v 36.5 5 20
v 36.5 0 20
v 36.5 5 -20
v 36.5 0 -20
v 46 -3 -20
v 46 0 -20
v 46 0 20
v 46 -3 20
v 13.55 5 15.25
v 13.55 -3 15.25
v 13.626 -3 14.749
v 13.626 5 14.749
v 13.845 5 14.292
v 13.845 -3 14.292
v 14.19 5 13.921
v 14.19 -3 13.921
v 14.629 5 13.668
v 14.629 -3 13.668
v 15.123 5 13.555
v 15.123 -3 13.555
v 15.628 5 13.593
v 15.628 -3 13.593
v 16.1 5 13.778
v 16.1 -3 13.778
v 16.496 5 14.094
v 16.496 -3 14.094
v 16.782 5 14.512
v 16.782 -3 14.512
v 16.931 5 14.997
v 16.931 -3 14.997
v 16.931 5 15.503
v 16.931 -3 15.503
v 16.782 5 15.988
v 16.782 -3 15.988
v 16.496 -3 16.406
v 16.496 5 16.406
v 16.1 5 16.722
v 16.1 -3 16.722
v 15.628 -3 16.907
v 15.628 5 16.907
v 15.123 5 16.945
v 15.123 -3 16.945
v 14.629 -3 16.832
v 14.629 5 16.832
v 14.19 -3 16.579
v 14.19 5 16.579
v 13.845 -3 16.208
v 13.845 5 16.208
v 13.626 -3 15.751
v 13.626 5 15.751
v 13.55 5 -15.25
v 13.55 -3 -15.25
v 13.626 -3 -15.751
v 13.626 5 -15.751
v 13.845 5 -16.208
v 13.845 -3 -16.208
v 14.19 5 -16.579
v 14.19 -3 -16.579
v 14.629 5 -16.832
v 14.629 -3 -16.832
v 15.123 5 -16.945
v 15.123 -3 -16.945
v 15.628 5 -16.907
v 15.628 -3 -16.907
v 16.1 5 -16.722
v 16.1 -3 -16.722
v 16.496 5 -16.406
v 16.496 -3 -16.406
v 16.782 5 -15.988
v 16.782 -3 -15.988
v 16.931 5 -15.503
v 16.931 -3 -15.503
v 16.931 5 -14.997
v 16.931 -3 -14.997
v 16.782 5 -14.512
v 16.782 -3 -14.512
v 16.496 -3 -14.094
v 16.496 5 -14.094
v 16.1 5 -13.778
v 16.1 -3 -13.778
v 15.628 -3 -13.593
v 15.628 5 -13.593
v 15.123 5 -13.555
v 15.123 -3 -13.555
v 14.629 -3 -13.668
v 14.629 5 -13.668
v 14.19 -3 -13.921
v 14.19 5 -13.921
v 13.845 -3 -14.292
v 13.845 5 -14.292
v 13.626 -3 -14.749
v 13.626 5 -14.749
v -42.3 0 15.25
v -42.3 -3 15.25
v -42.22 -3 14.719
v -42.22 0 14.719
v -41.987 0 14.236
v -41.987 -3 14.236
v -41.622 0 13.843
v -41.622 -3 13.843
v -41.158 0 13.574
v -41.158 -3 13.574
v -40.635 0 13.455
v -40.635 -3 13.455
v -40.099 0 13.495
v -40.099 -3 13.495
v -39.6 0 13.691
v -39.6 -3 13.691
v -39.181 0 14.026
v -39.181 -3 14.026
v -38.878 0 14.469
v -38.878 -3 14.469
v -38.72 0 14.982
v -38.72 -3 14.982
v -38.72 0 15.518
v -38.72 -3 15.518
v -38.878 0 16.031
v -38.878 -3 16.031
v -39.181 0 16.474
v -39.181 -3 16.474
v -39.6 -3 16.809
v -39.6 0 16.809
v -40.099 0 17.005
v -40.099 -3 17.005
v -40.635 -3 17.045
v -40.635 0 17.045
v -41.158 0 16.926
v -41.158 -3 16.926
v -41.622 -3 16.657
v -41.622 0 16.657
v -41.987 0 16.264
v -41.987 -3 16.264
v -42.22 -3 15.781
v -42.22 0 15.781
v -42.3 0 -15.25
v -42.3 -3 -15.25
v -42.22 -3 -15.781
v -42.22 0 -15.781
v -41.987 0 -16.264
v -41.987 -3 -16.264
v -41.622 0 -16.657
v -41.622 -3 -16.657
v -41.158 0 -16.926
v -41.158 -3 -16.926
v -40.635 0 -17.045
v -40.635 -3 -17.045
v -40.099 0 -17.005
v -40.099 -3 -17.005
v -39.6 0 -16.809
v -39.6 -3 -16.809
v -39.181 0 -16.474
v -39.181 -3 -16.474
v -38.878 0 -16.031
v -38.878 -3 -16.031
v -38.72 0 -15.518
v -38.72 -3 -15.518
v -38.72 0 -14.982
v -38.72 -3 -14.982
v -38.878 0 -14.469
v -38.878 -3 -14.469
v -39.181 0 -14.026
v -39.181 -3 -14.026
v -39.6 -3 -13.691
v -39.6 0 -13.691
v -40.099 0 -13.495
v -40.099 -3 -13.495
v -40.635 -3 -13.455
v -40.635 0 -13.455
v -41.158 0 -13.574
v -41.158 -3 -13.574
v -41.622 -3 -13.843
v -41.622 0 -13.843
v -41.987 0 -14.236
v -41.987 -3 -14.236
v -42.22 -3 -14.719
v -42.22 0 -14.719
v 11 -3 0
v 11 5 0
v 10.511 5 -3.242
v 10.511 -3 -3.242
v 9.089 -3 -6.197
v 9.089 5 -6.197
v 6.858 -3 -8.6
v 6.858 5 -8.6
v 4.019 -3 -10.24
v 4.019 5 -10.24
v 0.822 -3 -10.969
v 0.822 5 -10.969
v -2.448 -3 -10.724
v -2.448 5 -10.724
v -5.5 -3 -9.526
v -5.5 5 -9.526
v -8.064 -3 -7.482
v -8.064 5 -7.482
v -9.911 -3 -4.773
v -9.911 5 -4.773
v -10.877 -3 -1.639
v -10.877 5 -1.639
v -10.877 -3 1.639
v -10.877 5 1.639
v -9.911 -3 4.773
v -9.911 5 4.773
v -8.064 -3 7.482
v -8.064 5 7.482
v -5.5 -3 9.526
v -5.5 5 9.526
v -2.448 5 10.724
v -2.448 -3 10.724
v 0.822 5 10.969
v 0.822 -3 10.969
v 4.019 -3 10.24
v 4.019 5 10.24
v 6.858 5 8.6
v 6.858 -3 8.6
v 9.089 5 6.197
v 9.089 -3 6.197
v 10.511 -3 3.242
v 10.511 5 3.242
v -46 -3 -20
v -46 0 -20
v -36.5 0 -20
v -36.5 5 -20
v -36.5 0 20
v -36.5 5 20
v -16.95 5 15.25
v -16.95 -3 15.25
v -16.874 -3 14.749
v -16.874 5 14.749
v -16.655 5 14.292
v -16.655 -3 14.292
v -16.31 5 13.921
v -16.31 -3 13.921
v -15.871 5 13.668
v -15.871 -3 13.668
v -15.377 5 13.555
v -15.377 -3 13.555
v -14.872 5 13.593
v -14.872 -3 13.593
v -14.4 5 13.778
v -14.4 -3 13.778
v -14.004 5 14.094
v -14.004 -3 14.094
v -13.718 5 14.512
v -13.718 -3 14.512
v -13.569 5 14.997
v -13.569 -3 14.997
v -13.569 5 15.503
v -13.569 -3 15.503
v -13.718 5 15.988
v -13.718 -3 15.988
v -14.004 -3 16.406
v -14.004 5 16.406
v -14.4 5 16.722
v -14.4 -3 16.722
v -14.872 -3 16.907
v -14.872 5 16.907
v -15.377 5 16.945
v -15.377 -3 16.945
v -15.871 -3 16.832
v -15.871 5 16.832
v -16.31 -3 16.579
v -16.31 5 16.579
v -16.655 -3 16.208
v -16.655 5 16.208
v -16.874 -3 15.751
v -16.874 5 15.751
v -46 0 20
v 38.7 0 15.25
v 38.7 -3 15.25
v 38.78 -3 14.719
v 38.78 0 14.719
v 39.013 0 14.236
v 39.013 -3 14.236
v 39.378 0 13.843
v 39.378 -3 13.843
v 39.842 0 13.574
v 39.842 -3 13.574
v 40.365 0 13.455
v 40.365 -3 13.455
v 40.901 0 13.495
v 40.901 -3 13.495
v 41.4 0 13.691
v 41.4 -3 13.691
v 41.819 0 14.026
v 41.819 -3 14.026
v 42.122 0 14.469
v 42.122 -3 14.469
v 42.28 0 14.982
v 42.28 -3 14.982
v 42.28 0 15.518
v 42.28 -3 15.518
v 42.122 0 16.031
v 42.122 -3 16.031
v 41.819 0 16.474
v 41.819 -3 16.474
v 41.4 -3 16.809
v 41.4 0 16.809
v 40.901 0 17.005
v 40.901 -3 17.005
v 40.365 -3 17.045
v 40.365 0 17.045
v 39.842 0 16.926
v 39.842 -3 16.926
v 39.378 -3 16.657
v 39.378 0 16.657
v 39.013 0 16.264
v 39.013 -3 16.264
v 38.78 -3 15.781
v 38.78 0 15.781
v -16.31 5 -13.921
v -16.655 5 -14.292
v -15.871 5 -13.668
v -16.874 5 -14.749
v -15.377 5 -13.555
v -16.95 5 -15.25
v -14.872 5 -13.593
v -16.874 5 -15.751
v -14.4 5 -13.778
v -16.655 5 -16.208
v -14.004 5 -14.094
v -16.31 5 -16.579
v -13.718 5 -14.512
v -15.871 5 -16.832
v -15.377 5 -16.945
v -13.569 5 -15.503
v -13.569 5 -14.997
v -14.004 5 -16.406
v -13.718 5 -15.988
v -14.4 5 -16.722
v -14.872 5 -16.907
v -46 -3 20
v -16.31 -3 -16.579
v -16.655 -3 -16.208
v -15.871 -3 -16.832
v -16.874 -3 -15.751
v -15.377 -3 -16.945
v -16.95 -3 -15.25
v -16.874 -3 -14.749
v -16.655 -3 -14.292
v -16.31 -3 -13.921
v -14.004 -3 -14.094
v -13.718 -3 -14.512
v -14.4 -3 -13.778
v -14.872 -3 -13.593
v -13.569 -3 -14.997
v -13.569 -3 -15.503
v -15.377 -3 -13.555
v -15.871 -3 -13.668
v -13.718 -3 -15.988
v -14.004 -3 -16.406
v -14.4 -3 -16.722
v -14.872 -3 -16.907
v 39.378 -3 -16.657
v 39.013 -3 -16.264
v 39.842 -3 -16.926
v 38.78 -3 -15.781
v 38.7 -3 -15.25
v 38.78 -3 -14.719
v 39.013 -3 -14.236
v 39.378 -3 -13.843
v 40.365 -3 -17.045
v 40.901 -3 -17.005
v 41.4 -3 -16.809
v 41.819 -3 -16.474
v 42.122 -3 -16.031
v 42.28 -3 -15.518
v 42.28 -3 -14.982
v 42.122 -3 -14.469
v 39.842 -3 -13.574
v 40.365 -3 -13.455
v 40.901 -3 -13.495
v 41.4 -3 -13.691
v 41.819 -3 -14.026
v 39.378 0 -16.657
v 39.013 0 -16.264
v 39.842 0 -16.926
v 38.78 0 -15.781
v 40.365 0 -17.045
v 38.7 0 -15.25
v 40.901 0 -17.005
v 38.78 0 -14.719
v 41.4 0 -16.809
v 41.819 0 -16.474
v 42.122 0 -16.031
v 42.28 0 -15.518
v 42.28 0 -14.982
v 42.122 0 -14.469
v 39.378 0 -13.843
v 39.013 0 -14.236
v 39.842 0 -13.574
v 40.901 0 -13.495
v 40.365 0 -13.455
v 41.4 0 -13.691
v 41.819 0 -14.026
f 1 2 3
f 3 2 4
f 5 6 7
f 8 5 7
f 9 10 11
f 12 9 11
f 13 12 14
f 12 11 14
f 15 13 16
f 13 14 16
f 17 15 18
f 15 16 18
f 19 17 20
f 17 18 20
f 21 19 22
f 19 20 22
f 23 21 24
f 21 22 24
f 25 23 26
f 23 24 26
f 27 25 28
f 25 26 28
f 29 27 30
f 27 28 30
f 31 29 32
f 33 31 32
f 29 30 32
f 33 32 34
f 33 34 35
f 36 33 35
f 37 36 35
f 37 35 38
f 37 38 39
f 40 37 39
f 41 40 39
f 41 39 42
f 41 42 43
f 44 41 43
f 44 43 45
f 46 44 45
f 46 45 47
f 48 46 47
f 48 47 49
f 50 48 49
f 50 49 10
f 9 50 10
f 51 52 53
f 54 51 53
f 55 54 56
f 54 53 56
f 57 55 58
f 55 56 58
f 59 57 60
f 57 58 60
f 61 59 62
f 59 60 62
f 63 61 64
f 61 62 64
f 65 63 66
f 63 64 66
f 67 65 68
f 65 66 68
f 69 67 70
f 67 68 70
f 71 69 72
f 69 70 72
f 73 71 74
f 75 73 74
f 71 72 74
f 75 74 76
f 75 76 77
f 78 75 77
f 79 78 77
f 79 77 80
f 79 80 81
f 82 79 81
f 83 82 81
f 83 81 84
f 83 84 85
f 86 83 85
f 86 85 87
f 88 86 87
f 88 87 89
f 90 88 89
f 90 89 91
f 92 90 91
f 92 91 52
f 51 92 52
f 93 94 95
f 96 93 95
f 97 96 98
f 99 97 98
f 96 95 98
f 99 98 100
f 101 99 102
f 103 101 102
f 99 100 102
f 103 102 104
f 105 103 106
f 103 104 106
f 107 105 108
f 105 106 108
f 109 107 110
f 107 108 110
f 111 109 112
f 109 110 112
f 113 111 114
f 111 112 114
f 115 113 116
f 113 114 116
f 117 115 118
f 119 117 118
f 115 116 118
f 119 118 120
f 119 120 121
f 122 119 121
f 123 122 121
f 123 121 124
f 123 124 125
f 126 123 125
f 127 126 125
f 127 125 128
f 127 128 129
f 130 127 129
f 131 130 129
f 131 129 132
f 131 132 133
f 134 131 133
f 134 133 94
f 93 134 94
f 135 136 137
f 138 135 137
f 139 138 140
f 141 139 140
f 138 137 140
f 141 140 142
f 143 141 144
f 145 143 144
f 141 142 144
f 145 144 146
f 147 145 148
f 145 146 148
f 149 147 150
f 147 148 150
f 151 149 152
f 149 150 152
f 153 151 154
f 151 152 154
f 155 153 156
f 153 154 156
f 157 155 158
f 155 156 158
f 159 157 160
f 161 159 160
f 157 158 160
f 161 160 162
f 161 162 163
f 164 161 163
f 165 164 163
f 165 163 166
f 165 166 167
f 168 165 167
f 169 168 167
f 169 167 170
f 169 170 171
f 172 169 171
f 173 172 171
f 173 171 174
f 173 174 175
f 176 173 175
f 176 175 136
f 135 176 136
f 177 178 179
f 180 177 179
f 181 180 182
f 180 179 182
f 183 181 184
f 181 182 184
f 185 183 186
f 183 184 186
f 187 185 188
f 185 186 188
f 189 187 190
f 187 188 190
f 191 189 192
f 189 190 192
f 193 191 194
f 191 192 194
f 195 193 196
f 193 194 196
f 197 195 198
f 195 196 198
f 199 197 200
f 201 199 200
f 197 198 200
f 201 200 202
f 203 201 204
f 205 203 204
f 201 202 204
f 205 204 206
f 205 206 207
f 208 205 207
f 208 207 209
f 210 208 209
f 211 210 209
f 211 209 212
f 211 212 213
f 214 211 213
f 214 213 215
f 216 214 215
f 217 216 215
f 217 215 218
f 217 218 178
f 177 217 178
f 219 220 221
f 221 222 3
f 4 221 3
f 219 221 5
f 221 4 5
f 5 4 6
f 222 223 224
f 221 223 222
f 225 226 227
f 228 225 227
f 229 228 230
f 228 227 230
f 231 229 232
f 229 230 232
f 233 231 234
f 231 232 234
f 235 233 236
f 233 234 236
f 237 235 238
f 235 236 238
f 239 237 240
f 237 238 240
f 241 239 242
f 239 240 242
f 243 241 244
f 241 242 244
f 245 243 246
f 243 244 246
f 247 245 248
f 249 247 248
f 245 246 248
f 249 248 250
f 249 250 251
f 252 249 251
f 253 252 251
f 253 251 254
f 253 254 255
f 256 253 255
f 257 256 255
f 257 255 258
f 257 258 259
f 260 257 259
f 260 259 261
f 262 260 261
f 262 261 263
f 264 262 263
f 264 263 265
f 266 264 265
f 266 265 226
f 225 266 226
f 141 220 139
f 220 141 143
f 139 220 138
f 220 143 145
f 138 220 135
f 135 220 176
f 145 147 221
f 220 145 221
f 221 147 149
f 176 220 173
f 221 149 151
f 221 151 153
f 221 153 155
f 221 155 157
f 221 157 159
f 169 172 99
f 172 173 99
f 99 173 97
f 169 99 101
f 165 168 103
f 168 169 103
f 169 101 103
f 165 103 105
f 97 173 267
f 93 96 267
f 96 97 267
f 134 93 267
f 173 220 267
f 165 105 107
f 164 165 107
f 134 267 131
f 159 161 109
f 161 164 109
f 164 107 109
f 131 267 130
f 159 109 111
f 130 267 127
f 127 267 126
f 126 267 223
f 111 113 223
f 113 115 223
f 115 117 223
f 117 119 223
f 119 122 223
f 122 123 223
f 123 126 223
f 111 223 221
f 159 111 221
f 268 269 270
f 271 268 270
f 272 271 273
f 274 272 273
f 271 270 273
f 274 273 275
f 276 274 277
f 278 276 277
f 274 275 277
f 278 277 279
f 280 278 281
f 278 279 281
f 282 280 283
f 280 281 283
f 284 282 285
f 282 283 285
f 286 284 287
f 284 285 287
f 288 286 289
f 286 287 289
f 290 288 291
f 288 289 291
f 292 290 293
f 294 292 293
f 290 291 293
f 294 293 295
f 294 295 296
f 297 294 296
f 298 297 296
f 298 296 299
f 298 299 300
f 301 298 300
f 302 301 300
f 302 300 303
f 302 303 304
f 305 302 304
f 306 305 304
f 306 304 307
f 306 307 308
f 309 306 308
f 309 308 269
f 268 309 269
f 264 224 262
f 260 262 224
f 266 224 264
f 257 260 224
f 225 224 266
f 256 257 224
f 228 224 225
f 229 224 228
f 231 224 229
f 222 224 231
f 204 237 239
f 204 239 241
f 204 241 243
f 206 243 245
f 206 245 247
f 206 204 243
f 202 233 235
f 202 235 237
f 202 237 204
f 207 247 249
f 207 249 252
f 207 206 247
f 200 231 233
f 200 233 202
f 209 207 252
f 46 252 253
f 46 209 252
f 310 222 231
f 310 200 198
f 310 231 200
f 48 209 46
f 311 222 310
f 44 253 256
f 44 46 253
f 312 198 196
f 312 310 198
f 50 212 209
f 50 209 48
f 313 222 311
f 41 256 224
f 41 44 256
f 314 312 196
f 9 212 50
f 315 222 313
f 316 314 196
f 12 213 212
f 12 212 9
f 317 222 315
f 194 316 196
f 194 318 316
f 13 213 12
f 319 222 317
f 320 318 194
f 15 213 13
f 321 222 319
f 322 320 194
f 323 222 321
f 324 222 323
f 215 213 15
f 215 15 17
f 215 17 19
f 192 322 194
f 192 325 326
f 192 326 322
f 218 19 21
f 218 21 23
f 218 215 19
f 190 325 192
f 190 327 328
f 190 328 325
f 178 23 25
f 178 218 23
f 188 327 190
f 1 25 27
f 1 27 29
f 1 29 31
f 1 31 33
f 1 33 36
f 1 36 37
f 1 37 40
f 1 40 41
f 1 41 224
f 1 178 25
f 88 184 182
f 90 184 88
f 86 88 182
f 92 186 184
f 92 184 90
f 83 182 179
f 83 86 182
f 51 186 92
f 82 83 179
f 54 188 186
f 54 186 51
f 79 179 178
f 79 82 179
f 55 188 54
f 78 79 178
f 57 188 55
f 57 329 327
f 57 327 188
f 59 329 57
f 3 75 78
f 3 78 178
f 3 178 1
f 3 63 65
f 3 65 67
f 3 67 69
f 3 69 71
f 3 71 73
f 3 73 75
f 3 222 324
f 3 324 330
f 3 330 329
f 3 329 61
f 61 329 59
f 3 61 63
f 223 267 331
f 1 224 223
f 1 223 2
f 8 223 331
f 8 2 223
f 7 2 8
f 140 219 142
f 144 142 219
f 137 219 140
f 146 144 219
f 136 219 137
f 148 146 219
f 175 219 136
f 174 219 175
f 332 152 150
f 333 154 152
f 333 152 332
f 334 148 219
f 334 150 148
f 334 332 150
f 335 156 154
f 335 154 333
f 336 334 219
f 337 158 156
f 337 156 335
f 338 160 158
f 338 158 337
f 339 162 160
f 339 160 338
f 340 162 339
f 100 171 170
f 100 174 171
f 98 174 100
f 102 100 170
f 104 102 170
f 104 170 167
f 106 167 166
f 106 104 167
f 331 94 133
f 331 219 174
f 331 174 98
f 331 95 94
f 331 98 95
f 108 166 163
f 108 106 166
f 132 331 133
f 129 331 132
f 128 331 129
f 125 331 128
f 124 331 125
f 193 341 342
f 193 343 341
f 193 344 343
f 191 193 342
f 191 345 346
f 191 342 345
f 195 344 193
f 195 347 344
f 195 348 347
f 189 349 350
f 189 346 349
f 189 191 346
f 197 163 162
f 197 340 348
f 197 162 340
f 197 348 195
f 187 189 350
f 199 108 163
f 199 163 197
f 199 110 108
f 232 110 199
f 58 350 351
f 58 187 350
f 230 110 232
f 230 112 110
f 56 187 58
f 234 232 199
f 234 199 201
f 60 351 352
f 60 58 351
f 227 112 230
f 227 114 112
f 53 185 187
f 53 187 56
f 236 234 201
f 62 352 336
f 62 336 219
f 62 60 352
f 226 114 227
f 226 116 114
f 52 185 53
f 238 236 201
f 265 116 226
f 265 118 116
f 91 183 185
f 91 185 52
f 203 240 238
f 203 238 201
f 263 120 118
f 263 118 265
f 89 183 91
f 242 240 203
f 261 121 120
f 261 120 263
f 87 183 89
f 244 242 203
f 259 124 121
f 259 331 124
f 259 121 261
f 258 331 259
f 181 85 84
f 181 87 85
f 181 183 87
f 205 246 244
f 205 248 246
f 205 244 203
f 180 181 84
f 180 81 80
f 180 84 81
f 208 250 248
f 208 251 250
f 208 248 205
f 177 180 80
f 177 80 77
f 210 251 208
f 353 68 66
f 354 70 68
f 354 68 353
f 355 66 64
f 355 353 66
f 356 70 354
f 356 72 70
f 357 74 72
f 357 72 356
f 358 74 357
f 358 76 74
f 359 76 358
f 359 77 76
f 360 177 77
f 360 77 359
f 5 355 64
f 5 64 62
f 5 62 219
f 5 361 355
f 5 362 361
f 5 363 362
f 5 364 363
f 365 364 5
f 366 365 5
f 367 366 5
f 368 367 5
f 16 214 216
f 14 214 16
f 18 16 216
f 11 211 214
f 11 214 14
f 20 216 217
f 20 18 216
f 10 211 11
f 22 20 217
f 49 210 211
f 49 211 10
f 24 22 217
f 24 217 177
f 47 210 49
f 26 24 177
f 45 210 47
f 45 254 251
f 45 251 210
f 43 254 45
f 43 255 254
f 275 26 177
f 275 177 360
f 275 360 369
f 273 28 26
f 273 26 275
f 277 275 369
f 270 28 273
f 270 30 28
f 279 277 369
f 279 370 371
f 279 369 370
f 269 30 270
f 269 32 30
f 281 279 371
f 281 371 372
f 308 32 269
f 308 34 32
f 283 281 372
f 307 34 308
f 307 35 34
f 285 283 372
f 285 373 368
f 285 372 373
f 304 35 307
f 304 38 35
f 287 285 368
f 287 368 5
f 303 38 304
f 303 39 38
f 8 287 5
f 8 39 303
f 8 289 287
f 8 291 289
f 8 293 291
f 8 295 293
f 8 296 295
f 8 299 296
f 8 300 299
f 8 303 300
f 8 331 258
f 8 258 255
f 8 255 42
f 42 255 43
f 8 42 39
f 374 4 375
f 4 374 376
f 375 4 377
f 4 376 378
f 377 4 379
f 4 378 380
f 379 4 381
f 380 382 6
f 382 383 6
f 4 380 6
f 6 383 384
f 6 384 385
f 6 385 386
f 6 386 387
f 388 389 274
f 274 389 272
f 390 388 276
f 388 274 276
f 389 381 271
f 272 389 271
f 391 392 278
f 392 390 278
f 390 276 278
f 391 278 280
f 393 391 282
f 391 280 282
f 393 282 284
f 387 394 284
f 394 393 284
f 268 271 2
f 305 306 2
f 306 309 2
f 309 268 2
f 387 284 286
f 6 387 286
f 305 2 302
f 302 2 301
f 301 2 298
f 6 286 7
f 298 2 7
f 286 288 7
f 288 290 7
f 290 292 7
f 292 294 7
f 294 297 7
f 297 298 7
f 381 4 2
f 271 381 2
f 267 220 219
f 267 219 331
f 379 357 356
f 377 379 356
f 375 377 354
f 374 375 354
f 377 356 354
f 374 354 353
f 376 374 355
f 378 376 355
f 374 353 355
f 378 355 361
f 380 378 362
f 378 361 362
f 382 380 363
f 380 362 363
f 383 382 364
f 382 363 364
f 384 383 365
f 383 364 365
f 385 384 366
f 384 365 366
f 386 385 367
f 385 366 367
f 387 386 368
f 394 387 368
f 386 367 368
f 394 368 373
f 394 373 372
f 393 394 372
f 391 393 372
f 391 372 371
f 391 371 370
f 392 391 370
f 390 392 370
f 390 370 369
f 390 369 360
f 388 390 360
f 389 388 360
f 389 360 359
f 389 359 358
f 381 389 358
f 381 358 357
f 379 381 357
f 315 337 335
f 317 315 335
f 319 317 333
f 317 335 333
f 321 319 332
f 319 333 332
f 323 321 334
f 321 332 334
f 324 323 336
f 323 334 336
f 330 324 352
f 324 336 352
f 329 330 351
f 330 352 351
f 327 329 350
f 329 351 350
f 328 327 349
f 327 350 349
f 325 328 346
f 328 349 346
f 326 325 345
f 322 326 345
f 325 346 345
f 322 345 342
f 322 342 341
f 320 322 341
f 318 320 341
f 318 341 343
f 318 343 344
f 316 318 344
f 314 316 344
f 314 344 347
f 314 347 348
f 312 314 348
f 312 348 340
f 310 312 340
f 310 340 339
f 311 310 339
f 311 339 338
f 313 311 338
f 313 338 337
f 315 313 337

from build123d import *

# Parameters (mm, degrees)
SKETCH1_W            = 73
SKETCH1_H            = 40
BOSS_EXTRUDE1_DEPTH  = 5
SKETCH2_W            = 92
SKETCH2_H            = 40
BOSS_EXTRUDE2_DEPTH  = 3
M3_CLEARANCE_HOLE1_D = 3.6
M3_CLEARANCE_HOLE2_D = 3.4
SKETCH9_R            = 11
CUT_EXTRUDE1_DEPTH   = 9


with BuildPart() as part:
    # Sketch1 → Boss-Extrude1 (new body)
    with BuildSketch(Plane(origin=(0, 0, 0), x_dir=(1, 0, 0), z_dir=(0, 1, 0))):
        Rectangle(SKETCH1_W, SKETCH1_H)
    extrude(amount=BOSS_EXTRUDE1_DEPTH)

    # Sketch2 → Boss-Extrude2 (add)
    with BuildSketch(Plane.XZ):
        Rectangle(SKETCH2_W, SKETCH2_H)
    extrude(amount=BOSS_EXTRUDE2_DEPTH)

    # M3 Clearance Hole1 (through all)
    with Locations(Plane(origin=(0, 0, 0), x_dir=(1, 0, 0), z_dir=(0, 1, 0))):
        with Locations((-40.5, 15.25), (-40.5, -15.25), (40.5, 15.25), (40.5, -15.25)):
            Hole(M3_CLEARANCE_HOLE1_D / 2)

    # M3 Clearance Hole2 (through all)
    with Locations(Plane(origin=(0, 5, 0), x_dir=(1, 0, 0), z_dir=(0, 1, 0))):
        with Locations((0, 0), (15.25, 15.25), (-15.25, -15.25), (-15.25, 15.25), (15.25, -15.25)):
            Hole(M3_CLEARANCE_HOLE2_D / 2)

    # Sketch9 → Cut-Extrude1 (cut, through all)
    with BuildSketch(Plane(origin=(0, 5, 0), x_dir=(1, 0, 0), z_dir=(0, 1, 0))):
        Circle(SKETCH9_R)
    extrude(amount=-CUT_EXTRUDE1_DEPTH, mode=Mode.SUBTRACT)


solid = part.part
